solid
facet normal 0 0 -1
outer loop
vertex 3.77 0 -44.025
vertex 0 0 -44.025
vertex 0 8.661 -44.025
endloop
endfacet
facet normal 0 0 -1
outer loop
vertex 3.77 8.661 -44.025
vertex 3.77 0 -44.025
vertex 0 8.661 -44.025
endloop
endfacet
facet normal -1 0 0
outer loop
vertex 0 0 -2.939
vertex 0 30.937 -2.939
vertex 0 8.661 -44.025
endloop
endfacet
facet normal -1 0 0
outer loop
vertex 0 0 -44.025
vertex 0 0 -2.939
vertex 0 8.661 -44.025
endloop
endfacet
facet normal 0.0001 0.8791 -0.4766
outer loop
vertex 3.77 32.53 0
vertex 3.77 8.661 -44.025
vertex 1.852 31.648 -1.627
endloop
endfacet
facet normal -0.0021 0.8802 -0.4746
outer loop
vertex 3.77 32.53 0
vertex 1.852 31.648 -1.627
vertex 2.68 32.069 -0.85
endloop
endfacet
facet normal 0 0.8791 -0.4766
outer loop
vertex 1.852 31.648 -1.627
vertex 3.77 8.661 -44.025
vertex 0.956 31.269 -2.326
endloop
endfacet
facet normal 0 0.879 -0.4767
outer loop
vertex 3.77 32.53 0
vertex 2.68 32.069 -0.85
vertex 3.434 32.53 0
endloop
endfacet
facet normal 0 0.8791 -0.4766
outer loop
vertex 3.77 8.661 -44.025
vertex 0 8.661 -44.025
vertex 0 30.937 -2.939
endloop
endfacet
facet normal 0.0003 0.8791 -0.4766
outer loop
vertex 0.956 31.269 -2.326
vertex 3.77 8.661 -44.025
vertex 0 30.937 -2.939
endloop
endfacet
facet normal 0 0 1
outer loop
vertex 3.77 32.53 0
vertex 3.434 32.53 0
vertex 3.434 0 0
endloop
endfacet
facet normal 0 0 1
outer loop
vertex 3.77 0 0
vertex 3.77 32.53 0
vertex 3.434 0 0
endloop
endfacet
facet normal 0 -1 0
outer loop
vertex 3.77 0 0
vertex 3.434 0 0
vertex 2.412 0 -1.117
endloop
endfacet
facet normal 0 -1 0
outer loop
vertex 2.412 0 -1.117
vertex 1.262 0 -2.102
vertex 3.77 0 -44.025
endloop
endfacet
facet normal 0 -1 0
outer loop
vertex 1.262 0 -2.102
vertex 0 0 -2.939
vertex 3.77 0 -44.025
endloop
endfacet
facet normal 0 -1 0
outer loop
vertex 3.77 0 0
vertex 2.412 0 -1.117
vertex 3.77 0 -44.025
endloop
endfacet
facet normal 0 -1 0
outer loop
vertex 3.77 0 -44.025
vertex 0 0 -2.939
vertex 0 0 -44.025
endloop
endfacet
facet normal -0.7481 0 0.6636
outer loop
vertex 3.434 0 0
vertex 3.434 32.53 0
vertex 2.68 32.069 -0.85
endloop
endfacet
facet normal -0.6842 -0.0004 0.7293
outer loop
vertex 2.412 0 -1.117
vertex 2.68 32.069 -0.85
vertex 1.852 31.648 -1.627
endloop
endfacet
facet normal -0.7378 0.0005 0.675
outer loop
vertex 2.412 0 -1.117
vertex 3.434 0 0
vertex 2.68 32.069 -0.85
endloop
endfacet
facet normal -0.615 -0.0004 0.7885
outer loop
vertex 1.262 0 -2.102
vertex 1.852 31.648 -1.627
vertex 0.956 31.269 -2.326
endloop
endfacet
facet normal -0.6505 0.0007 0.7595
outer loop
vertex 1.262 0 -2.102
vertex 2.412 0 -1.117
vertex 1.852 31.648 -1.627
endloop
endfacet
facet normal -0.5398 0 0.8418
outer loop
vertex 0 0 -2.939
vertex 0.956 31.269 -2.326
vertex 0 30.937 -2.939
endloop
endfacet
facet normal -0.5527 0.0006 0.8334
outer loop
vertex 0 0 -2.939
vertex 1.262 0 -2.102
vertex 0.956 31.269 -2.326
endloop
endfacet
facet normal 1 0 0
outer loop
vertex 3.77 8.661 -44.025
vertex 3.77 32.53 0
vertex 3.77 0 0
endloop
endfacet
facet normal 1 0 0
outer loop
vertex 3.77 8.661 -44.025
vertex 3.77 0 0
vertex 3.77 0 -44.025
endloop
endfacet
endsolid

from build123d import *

# Parameters (mm, degrees)
BOSS_EXTRUDE1_DEPTH = 3.77
FILLET1_R           = 0.2
CAVITY1_DEPTH       = 32.53
CUT_EXTRUDE1_DEPTH  = 10


# Read off the part's stored shape, not the designer's step: Cavity1
with BuildPart() as part:
    # Sketch1 → Boss-Extrude1 (new body)
    with BuildSketch(Plane(origin=(0, 0, 0), x_dir=(0, 0, -1), z_dir=(1, 0, 0))):
        Polygon((0, 0), (60, 0), (0, 32.53), align=None)
    extrude(amount=BOSS_EXTRUDE1_DEPTH)

    # Fillet1
    fillet1_edges = [part.edges().sort_by_distance(p)[0] for p in [
        (1.885, 0, -60),
    ]]
    fillet(fillet1_edges, radius=FILLET1_R)

    # Cavity1 outline → Cavity1 (cut)
    with BuildSketch(Plane(origin=(0, 0, 0), x_dir=(1, 0, 0), z_dir=(0, 1, 0))):
        with BuildLine():
            Line((0, 0), (3.434066763, 0))
            ThreePointArc((3.434066763, 0), (1.851918424, 1.627143202), (0, 2.939083185))
            Line((0, 2.939083185), (0, 0))
        make_face()
    extrude(amount=CAVITY1_DEPTH, mode=Mode.SUBTRACT)

    # Sketch2 → Cut-Extrude1 (cut)
    with BuildSketch(Plane.ZY):
        Polygon((-44.024699242, 0), (-44.024699242, 8.661275561), (-59.306815437, 0.375821564), (-59.211490846, 0), align=None)
    extrude(amount=-CUT_EXTRUDE1_DEPTH, mode=Mode.SUBTRACT)


with BuildPart() as body_2:
    # of the pieces the cut leaves, the one that is kept (cut_extrude1_keep)
    add(part.part.solids().sort_by_distance((0, 0, -2.939083185))[0])


solid = body_2.part
